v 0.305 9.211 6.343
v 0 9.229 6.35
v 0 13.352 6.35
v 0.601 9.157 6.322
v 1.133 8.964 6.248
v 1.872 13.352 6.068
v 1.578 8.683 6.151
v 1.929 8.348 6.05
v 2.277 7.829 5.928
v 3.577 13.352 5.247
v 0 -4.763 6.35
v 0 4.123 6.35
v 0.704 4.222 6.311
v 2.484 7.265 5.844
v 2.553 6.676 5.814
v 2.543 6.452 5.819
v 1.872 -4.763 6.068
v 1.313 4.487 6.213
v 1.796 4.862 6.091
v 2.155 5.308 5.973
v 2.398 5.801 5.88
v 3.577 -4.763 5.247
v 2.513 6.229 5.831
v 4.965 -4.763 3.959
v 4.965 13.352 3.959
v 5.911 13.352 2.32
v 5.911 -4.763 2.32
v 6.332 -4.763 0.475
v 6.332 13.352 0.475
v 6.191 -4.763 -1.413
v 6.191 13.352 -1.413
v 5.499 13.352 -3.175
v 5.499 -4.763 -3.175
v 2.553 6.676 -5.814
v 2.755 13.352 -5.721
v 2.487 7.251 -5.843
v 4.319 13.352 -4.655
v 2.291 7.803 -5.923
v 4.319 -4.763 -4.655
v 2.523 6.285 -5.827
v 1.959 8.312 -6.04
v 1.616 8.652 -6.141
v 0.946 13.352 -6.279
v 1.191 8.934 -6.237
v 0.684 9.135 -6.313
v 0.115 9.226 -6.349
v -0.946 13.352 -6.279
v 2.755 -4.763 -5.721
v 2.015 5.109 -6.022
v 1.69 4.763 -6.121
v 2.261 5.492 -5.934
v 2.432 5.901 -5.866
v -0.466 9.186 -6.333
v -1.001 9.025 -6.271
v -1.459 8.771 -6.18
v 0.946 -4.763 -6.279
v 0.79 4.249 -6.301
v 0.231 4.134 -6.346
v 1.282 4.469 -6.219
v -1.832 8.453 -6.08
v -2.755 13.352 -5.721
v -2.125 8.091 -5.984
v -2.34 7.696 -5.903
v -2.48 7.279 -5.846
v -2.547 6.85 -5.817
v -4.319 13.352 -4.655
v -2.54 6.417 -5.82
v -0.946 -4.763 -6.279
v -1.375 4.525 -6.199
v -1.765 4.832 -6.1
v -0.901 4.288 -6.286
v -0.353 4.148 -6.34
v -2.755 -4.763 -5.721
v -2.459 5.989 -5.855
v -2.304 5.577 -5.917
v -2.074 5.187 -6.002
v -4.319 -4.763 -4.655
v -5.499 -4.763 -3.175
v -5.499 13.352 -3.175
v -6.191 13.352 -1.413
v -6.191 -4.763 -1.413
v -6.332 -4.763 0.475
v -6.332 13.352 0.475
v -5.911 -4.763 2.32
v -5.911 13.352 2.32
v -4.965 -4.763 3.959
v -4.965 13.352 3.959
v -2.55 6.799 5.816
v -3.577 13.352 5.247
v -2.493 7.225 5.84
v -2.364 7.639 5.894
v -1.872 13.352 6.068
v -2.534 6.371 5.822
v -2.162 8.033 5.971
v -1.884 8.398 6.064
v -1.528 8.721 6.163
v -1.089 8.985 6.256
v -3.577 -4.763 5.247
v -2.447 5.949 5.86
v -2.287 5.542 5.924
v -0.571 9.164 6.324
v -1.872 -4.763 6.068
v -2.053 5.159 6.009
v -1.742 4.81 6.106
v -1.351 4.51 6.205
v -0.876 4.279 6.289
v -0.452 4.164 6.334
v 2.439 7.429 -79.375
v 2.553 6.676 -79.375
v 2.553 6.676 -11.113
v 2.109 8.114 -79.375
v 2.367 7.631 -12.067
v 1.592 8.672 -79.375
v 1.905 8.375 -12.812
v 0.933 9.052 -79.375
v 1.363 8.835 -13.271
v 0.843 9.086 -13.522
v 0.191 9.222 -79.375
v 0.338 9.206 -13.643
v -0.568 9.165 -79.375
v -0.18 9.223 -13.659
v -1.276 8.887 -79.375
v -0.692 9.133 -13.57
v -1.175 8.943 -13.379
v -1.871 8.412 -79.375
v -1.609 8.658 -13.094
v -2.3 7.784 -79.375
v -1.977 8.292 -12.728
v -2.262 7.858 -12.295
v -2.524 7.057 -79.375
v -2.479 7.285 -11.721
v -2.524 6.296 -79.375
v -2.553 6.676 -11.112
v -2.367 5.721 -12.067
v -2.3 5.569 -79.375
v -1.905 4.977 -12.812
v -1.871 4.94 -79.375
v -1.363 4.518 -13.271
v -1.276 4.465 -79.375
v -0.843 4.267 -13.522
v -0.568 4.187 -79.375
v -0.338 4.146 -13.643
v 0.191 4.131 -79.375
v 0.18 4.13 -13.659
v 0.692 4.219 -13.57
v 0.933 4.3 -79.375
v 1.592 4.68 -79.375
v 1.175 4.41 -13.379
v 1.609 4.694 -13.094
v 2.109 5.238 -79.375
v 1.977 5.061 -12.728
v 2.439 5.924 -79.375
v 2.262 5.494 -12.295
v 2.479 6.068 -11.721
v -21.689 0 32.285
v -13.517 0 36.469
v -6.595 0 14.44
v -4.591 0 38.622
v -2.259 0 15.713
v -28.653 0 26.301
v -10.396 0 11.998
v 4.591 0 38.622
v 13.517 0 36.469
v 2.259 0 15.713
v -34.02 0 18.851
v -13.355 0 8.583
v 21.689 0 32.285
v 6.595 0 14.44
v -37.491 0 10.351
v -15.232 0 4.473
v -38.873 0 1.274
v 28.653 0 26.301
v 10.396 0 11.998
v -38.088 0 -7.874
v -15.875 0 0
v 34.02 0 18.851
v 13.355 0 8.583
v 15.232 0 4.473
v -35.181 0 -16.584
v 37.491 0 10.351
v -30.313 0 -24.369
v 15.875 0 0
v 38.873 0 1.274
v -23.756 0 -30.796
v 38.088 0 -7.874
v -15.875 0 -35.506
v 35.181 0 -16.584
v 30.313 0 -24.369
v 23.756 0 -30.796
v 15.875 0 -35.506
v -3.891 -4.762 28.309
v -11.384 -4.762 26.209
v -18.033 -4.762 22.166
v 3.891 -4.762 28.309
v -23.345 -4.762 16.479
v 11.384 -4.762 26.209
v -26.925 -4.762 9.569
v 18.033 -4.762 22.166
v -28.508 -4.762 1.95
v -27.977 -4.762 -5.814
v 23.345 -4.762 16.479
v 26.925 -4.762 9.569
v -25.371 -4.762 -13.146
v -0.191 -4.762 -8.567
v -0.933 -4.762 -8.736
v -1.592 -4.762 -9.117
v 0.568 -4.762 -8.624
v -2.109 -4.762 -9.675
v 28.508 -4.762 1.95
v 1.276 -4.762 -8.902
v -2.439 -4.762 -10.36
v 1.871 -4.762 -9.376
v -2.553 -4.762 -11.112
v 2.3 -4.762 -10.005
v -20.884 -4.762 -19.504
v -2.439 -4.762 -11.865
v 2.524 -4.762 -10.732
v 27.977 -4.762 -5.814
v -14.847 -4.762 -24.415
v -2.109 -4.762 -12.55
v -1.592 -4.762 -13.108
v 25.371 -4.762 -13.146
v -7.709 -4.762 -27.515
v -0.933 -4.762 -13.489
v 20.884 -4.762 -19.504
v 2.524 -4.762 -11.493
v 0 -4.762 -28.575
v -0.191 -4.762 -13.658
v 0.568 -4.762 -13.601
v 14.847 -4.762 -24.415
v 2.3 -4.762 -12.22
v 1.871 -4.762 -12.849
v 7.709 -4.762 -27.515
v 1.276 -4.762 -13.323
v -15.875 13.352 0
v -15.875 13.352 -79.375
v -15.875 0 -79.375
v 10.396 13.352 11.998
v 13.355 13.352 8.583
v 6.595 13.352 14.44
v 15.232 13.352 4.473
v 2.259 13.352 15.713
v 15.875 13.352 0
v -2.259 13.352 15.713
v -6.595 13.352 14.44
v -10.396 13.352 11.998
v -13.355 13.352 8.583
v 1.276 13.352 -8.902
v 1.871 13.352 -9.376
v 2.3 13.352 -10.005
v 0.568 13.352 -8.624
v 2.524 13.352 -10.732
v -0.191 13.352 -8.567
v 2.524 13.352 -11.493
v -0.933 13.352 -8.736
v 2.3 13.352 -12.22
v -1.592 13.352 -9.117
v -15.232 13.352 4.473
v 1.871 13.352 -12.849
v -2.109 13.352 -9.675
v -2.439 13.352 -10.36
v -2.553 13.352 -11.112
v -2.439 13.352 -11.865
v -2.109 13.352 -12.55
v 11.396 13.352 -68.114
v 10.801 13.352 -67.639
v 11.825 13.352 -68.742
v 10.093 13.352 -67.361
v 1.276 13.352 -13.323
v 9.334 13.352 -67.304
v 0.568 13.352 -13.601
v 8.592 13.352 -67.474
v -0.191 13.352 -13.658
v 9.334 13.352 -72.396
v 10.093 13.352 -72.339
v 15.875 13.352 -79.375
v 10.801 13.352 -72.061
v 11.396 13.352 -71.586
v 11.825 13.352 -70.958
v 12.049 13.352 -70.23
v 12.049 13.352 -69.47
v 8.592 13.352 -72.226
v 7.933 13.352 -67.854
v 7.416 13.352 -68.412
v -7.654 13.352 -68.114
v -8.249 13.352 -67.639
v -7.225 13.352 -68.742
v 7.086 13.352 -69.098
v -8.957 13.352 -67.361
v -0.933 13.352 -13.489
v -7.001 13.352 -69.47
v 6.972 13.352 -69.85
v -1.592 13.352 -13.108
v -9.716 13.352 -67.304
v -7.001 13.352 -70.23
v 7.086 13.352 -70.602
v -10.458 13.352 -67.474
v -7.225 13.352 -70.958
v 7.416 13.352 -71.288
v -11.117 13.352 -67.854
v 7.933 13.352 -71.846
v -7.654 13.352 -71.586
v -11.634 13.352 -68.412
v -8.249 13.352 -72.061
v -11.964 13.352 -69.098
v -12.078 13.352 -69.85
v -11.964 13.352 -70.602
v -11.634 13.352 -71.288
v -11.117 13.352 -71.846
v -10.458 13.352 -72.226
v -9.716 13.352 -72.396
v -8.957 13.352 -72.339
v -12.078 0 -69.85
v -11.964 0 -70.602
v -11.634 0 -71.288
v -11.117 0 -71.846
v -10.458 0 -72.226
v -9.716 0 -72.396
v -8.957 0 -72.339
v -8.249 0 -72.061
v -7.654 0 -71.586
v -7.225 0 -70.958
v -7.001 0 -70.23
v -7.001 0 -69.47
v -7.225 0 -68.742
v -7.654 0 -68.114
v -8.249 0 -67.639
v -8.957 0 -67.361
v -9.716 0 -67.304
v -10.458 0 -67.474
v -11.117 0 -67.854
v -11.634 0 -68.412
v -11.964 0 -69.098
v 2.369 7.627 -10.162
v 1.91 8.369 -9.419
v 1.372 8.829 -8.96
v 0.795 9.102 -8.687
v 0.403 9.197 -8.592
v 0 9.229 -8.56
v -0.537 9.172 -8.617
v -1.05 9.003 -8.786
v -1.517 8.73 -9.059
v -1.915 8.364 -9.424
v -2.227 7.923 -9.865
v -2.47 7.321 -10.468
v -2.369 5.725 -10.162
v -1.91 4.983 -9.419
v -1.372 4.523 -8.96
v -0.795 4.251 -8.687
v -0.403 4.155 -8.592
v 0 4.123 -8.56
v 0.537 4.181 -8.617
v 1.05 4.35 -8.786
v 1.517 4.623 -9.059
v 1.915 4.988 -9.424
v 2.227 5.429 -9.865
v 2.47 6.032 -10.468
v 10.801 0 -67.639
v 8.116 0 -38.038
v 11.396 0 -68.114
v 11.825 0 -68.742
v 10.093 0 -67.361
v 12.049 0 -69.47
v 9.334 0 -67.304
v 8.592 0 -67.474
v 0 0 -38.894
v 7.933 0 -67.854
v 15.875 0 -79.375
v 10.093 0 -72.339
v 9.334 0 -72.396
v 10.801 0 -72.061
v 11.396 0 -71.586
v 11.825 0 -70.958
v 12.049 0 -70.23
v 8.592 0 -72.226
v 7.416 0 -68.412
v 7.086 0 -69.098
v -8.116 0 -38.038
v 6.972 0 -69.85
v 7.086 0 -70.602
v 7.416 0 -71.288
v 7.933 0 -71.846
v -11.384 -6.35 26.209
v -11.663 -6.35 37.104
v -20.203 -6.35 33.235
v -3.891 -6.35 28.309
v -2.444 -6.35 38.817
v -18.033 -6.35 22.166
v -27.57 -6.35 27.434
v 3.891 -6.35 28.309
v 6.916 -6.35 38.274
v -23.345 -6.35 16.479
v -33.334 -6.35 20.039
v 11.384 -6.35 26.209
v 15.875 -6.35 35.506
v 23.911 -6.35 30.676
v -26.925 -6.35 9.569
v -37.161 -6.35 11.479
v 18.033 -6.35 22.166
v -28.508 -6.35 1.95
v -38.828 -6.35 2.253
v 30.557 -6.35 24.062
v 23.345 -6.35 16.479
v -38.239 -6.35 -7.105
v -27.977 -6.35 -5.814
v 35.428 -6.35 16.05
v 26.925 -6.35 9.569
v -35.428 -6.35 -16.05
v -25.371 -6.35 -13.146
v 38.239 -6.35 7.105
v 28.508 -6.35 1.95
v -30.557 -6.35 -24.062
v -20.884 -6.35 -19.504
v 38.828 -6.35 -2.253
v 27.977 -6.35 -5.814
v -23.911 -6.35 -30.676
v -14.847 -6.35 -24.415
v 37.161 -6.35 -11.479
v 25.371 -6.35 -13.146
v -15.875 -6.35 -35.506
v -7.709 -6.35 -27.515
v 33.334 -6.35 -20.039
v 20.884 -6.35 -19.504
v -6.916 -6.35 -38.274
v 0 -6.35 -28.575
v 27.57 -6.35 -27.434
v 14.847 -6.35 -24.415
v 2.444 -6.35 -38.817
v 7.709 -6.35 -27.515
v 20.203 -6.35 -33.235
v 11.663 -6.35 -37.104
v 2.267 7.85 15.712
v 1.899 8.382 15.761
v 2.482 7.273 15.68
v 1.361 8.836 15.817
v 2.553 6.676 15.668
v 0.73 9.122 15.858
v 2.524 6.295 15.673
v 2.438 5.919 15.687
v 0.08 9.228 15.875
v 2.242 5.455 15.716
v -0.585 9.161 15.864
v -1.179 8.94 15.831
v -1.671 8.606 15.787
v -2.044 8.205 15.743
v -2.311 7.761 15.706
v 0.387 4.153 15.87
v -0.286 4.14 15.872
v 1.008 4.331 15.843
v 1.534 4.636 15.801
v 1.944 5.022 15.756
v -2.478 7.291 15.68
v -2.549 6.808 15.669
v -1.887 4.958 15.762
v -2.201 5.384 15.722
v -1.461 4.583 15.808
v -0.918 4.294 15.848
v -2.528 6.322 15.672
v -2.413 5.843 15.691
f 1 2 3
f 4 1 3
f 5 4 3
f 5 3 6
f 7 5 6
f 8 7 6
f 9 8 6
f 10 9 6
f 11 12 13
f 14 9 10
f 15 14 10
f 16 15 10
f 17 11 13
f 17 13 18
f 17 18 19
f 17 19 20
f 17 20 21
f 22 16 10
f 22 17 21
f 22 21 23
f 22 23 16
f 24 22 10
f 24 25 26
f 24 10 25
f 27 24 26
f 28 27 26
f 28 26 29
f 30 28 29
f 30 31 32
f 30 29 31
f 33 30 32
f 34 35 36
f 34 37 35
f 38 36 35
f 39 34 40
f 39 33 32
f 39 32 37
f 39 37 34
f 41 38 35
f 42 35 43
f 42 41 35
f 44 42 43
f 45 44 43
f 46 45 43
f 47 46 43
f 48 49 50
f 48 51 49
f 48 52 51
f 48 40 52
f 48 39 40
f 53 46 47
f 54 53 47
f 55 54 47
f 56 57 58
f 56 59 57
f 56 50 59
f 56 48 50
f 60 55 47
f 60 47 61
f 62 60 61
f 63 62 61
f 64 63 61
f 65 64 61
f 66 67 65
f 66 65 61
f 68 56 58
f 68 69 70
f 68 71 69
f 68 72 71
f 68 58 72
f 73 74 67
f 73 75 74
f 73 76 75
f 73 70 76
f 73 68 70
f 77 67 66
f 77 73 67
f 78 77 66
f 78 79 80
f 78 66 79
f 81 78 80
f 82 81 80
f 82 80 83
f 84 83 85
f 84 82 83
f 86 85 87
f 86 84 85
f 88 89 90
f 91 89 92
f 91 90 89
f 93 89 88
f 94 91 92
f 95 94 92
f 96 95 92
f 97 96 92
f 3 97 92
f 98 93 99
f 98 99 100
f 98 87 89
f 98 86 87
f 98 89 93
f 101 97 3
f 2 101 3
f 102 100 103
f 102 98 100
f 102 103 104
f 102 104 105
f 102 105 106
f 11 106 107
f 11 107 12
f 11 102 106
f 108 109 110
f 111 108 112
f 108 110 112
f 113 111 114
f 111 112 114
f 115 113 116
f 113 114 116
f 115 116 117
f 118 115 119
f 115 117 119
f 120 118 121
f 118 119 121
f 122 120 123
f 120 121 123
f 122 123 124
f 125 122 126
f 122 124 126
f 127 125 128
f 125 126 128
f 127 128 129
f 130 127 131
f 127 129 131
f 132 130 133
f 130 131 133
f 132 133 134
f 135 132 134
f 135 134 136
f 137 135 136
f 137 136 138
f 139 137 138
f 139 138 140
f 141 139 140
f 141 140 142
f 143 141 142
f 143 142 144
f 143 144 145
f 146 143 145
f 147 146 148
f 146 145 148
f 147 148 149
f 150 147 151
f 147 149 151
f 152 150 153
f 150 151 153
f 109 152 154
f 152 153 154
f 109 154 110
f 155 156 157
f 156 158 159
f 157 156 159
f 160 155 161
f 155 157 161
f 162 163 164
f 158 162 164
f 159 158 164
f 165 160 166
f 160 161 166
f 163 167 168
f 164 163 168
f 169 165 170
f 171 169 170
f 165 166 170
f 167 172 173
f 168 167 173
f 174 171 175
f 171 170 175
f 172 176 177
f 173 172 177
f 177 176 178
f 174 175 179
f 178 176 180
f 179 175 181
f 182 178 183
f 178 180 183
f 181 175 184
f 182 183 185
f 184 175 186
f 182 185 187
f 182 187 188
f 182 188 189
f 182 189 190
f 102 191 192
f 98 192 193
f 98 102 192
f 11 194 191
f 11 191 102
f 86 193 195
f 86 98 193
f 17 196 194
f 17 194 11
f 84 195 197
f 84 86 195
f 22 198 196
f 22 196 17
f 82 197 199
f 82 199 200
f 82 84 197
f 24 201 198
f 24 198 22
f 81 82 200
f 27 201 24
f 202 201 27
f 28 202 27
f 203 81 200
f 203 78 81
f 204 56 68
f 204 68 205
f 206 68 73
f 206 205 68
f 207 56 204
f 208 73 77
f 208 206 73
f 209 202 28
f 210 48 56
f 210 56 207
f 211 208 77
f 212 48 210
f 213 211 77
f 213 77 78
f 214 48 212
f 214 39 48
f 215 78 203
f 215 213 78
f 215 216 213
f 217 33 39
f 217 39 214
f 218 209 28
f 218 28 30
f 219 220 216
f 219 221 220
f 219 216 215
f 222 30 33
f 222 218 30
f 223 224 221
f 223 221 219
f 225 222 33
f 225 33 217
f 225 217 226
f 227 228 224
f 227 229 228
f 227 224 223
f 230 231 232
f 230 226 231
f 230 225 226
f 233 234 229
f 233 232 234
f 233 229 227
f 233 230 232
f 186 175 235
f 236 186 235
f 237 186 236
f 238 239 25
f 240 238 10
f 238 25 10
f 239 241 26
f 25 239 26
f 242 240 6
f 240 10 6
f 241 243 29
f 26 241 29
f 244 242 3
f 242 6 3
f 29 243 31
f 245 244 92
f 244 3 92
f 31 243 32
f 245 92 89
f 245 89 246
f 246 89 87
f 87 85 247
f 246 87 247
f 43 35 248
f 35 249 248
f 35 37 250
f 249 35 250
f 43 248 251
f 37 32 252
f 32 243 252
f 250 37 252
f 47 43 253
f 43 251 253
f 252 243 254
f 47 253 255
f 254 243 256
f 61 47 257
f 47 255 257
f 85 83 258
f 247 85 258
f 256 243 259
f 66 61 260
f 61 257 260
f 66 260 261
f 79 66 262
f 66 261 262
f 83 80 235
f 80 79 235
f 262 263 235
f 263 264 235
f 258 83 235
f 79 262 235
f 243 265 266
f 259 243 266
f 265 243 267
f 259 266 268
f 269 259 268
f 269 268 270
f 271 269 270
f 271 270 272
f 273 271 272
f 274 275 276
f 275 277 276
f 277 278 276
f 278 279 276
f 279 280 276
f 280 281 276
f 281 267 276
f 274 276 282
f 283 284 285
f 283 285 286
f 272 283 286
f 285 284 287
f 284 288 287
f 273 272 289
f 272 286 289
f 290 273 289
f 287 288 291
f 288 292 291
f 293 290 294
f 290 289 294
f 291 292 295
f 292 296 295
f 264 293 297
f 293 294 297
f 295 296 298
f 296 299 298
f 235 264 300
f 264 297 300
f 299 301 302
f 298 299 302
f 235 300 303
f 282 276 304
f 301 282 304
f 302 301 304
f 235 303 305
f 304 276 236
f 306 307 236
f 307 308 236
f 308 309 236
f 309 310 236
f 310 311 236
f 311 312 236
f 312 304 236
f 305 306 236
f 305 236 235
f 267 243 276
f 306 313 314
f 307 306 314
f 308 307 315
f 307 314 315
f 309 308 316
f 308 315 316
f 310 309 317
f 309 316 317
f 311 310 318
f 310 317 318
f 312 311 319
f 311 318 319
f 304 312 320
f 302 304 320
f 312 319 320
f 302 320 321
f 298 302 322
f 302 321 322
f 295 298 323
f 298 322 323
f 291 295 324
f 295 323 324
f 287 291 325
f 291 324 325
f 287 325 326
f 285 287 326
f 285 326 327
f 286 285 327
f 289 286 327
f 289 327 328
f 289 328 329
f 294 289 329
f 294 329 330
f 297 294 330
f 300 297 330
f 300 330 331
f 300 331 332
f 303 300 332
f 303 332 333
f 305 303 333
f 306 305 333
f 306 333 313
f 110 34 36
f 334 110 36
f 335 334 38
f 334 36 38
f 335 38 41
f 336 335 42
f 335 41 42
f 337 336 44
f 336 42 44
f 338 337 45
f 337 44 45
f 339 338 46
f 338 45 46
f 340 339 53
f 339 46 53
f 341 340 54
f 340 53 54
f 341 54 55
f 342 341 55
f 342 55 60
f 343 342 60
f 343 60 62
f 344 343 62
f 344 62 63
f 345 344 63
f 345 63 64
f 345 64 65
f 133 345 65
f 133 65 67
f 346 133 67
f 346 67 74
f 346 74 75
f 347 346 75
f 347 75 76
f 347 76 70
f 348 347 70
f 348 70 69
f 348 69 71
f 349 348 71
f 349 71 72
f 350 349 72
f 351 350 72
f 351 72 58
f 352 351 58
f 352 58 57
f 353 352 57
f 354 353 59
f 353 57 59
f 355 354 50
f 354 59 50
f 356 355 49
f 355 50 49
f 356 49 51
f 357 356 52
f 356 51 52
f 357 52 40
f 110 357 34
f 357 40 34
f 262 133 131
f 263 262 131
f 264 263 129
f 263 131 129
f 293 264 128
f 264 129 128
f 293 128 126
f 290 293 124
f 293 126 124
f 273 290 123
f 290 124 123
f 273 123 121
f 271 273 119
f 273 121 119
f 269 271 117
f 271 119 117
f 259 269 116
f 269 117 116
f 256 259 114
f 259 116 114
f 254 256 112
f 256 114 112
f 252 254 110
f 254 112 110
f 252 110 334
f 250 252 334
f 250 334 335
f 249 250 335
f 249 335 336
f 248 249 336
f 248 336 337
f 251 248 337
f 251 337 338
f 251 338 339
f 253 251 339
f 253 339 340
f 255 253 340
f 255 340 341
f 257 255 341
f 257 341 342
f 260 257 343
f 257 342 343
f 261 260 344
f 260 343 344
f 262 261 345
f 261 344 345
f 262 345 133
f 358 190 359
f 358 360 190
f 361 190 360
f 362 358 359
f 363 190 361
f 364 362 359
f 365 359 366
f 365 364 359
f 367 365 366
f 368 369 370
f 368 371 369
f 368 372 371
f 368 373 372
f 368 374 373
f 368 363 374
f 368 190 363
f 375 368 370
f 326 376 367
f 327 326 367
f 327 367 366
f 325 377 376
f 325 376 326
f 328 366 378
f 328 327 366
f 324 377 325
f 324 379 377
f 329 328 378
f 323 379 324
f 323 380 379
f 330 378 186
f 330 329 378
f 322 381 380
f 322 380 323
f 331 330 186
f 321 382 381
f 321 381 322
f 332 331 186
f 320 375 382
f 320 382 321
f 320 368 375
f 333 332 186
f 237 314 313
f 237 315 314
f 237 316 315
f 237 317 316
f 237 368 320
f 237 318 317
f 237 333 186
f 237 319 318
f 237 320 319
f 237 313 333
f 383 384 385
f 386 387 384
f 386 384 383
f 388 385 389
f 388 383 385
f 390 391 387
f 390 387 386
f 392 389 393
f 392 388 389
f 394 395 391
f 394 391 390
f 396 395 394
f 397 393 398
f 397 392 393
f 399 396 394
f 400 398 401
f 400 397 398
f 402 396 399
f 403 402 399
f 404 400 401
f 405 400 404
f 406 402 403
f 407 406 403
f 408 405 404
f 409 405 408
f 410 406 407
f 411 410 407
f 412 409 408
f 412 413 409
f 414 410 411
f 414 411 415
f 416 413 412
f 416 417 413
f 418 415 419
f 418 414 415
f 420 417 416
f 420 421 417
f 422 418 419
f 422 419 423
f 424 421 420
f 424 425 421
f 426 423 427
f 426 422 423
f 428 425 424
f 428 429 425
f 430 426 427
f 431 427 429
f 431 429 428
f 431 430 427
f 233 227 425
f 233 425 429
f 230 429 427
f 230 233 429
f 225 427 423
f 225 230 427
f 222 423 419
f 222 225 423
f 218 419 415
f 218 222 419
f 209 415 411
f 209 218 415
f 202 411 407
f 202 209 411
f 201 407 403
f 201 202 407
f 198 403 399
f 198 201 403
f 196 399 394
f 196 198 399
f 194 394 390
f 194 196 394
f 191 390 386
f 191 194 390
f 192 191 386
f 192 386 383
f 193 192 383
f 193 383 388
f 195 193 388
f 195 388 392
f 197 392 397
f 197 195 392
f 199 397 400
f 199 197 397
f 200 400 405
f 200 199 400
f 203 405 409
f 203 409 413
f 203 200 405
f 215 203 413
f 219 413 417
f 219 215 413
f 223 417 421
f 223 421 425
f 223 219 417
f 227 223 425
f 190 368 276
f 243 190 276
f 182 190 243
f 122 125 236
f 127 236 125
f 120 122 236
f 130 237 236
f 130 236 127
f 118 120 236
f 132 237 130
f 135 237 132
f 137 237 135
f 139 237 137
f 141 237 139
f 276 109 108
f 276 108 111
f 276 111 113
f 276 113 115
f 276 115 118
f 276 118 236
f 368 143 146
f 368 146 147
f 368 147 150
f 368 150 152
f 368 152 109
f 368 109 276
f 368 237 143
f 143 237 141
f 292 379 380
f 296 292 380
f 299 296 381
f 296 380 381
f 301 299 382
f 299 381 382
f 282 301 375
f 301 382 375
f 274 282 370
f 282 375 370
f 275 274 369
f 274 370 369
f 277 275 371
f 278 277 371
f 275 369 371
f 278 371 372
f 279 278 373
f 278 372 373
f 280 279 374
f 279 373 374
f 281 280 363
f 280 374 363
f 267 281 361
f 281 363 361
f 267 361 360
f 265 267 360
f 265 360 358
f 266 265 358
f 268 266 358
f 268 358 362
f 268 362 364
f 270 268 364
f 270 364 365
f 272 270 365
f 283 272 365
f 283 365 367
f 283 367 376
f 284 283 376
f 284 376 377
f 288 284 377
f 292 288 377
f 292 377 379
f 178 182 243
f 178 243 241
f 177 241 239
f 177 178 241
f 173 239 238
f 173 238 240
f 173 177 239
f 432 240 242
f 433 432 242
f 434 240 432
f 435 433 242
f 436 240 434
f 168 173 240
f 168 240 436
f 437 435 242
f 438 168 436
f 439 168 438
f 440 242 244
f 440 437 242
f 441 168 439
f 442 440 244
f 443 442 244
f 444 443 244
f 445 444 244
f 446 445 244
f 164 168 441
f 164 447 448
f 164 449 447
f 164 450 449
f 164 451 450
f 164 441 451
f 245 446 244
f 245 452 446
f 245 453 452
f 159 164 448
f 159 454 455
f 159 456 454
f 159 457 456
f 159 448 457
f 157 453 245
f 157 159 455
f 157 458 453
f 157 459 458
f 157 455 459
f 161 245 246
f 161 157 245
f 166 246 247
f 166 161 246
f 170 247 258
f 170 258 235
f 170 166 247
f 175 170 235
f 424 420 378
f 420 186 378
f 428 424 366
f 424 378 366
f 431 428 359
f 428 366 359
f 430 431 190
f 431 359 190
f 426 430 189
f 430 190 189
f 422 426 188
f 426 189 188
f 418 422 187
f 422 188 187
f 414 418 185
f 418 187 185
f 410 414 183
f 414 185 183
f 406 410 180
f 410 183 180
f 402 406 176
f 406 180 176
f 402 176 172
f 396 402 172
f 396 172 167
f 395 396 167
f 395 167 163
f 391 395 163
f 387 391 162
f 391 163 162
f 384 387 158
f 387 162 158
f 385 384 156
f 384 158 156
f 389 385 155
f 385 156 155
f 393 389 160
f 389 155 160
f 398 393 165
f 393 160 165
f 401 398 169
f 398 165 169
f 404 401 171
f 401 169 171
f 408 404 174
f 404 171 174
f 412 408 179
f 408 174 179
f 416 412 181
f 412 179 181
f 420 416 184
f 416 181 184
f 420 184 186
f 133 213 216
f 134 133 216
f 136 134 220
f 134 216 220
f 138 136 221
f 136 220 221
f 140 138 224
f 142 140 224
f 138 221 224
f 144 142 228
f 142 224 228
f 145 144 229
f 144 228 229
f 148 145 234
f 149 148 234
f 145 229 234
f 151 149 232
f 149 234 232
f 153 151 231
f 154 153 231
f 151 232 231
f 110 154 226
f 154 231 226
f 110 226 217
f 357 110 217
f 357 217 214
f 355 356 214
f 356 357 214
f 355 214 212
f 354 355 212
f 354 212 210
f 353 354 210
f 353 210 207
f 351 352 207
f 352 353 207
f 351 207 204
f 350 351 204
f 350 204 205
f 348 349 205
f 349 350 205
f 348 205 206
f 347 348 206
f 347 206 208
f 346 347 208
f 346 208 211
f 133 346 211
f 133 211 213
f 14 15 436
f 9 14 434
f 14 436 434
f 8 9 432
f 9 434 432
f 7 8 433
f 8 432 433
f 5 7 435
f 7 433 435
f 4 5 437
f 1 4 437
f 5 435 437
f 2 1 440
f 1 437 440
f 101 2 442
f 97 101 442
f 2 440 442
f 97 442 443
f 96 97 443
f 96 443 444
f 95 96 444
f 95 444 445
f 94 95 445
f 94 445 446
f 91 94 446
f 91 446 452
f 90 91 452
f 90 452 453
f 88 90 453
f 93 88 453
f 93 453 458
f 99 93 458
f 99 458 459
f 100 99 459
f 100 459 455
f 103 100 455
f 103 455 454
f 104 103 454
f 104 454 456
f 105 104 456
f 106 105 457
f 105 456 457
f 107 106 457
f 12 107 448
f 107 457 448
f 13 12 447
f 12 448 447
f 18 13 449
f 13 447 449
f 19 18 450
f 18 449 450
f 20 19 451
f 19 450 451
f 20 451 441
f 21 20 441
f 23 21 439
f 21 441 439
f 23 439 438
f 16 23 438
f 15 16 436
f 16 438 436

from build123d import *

# Parameters (mm, degrees)
BOSS_EXTRUDE1_DEPTH         = 13.352390271
SKETCH4_R                   = 38.89375
BOSS_EXTRUDE2_DEPTH         = 4.7625
CUT_EXTRUDE1_DEPTH          = 91.22895136
CUT_EXTRUDE1_DEPTH_BACK     = 91.22895136
SKETCH2_R                   = 6.35
SKETCH5_R                   = 38.89375
SKETCH5_R_2                 = 28.575
BOSS_EXTRUDE3_DEPTH         = 1.5875
F_1_4_20_TAPPED_HOLE1_D     = 5.1054
F_1_4_20_TAPPED_HOLE2_D     = 5.1054
F_1_4_20_TAPPED_HOLE2_DEPTH = 118.27002
F_1_4_20_TAPPED_HOLE2_TIP   = 1.533816902


with BuildPart() as part:
    # Sketch1 → Boss-Extrude1 (new body)
    with BuildSketch(Plane(origin=(0, 0, 0), x_dir=(1, 0, 0), z_dir=(0, 1, 0))):
        with BuildLine():
            Line((-15.875, 0), (-15.875, 79.375))
            Line((-15.875, 79.375), (15.875, 79.375))
            Line((15.875, 79.375), (15.875, 0))
            ThreePointArc((15.875, 0), (0, -15.875), (-15.875, 0))
        make_face()
    extrude(amount=BOSS_EXTRUDE1_DEPTH)

    # Sketch4 → Boss-Extrude2 (add)
    with BuildSketch(Plane.XZ):
        with Locations(Location((0, 0, 0), (0, 0, 245.910493888))):
            Circle(SKETCH4_R)
    extrude(amount=BOSS_EXTRUDE2_DEPTH)

    # Sketch2 → Cut-Extrude1 (cut, two sides: drawn at the far end of the back side and taken through both)
    with BuildSketch(Plane(origin=(0, 13.352390271, 0), x_dir=(1, 0, 0), z_dir=(0, 1, 0)).offset(-CUT_EXTRUDE1_DEPTH_BACK)):
        with Locations(Location((0, 0, 0), (0, 0, 270))):
            Circle(SKETCH2_R)
    extrude(amount=CUT_EXTRUDE1_DEPTH + CUT_EXTRUDE1_DEPTH_BACK, mode=Mode.SUBTRACT)

    # Sketch5 → Boss-Extrude3 (add)
    with BuildSketch(Plane.XZ.offset(4.7625)):
        with Locations(Location((0, 0, 0), (0, 0, 245.910493888))):
            Circle(SKETCH5_R)
        with Locations(Location((0, 0, 0), (0, 0, 270))):
            Circle(SKETCH5_R_2, mode=Mode.SUBTRACT)
    extrude(amount=BOSS_EXTRUDE3_DEPTH)

    # 1/4-20 Tapped Hole1 (through all)
    with Locations(Plane(origin=(0, 0, -79.375), x_dir=(-1, 0, 0), z_dir=(0, 0, -1))):
        with Locations((0, 6.676195135)):
            Hole(F_1_4_20_TAPPED_HOLE1_D / 2)

    # 1/4-20 Tapped Hole2
    with Locations(Plane(origin=(0, 13.352390271, 0), x_dir=(1, 0, 0), z_dir=(0, 1, 0))):
        with Locations((-9.525, 69.85), (9.525, 69.85), (0, 11.1125)):
            Hole(F_1_4_20_TAPPED_HOLE2_D / 2, depth=F_1_4_20_TAPPED_HOLE2_DEPTH)
            with Locations((0, 0, -(F_1_4_20_TAPPED_HOLE2_DEPTH + F_1_4_20_TAPPED_HOLE2_TIP / 2))):  # 118° drill point
                Cone(0, F_1_4_20_TAPPED_HOLE2_D / 2, F_1_4_20_TAPPED_HOLE2_TIP, mode=Mode.SUBTRACT)


solid = part.part
